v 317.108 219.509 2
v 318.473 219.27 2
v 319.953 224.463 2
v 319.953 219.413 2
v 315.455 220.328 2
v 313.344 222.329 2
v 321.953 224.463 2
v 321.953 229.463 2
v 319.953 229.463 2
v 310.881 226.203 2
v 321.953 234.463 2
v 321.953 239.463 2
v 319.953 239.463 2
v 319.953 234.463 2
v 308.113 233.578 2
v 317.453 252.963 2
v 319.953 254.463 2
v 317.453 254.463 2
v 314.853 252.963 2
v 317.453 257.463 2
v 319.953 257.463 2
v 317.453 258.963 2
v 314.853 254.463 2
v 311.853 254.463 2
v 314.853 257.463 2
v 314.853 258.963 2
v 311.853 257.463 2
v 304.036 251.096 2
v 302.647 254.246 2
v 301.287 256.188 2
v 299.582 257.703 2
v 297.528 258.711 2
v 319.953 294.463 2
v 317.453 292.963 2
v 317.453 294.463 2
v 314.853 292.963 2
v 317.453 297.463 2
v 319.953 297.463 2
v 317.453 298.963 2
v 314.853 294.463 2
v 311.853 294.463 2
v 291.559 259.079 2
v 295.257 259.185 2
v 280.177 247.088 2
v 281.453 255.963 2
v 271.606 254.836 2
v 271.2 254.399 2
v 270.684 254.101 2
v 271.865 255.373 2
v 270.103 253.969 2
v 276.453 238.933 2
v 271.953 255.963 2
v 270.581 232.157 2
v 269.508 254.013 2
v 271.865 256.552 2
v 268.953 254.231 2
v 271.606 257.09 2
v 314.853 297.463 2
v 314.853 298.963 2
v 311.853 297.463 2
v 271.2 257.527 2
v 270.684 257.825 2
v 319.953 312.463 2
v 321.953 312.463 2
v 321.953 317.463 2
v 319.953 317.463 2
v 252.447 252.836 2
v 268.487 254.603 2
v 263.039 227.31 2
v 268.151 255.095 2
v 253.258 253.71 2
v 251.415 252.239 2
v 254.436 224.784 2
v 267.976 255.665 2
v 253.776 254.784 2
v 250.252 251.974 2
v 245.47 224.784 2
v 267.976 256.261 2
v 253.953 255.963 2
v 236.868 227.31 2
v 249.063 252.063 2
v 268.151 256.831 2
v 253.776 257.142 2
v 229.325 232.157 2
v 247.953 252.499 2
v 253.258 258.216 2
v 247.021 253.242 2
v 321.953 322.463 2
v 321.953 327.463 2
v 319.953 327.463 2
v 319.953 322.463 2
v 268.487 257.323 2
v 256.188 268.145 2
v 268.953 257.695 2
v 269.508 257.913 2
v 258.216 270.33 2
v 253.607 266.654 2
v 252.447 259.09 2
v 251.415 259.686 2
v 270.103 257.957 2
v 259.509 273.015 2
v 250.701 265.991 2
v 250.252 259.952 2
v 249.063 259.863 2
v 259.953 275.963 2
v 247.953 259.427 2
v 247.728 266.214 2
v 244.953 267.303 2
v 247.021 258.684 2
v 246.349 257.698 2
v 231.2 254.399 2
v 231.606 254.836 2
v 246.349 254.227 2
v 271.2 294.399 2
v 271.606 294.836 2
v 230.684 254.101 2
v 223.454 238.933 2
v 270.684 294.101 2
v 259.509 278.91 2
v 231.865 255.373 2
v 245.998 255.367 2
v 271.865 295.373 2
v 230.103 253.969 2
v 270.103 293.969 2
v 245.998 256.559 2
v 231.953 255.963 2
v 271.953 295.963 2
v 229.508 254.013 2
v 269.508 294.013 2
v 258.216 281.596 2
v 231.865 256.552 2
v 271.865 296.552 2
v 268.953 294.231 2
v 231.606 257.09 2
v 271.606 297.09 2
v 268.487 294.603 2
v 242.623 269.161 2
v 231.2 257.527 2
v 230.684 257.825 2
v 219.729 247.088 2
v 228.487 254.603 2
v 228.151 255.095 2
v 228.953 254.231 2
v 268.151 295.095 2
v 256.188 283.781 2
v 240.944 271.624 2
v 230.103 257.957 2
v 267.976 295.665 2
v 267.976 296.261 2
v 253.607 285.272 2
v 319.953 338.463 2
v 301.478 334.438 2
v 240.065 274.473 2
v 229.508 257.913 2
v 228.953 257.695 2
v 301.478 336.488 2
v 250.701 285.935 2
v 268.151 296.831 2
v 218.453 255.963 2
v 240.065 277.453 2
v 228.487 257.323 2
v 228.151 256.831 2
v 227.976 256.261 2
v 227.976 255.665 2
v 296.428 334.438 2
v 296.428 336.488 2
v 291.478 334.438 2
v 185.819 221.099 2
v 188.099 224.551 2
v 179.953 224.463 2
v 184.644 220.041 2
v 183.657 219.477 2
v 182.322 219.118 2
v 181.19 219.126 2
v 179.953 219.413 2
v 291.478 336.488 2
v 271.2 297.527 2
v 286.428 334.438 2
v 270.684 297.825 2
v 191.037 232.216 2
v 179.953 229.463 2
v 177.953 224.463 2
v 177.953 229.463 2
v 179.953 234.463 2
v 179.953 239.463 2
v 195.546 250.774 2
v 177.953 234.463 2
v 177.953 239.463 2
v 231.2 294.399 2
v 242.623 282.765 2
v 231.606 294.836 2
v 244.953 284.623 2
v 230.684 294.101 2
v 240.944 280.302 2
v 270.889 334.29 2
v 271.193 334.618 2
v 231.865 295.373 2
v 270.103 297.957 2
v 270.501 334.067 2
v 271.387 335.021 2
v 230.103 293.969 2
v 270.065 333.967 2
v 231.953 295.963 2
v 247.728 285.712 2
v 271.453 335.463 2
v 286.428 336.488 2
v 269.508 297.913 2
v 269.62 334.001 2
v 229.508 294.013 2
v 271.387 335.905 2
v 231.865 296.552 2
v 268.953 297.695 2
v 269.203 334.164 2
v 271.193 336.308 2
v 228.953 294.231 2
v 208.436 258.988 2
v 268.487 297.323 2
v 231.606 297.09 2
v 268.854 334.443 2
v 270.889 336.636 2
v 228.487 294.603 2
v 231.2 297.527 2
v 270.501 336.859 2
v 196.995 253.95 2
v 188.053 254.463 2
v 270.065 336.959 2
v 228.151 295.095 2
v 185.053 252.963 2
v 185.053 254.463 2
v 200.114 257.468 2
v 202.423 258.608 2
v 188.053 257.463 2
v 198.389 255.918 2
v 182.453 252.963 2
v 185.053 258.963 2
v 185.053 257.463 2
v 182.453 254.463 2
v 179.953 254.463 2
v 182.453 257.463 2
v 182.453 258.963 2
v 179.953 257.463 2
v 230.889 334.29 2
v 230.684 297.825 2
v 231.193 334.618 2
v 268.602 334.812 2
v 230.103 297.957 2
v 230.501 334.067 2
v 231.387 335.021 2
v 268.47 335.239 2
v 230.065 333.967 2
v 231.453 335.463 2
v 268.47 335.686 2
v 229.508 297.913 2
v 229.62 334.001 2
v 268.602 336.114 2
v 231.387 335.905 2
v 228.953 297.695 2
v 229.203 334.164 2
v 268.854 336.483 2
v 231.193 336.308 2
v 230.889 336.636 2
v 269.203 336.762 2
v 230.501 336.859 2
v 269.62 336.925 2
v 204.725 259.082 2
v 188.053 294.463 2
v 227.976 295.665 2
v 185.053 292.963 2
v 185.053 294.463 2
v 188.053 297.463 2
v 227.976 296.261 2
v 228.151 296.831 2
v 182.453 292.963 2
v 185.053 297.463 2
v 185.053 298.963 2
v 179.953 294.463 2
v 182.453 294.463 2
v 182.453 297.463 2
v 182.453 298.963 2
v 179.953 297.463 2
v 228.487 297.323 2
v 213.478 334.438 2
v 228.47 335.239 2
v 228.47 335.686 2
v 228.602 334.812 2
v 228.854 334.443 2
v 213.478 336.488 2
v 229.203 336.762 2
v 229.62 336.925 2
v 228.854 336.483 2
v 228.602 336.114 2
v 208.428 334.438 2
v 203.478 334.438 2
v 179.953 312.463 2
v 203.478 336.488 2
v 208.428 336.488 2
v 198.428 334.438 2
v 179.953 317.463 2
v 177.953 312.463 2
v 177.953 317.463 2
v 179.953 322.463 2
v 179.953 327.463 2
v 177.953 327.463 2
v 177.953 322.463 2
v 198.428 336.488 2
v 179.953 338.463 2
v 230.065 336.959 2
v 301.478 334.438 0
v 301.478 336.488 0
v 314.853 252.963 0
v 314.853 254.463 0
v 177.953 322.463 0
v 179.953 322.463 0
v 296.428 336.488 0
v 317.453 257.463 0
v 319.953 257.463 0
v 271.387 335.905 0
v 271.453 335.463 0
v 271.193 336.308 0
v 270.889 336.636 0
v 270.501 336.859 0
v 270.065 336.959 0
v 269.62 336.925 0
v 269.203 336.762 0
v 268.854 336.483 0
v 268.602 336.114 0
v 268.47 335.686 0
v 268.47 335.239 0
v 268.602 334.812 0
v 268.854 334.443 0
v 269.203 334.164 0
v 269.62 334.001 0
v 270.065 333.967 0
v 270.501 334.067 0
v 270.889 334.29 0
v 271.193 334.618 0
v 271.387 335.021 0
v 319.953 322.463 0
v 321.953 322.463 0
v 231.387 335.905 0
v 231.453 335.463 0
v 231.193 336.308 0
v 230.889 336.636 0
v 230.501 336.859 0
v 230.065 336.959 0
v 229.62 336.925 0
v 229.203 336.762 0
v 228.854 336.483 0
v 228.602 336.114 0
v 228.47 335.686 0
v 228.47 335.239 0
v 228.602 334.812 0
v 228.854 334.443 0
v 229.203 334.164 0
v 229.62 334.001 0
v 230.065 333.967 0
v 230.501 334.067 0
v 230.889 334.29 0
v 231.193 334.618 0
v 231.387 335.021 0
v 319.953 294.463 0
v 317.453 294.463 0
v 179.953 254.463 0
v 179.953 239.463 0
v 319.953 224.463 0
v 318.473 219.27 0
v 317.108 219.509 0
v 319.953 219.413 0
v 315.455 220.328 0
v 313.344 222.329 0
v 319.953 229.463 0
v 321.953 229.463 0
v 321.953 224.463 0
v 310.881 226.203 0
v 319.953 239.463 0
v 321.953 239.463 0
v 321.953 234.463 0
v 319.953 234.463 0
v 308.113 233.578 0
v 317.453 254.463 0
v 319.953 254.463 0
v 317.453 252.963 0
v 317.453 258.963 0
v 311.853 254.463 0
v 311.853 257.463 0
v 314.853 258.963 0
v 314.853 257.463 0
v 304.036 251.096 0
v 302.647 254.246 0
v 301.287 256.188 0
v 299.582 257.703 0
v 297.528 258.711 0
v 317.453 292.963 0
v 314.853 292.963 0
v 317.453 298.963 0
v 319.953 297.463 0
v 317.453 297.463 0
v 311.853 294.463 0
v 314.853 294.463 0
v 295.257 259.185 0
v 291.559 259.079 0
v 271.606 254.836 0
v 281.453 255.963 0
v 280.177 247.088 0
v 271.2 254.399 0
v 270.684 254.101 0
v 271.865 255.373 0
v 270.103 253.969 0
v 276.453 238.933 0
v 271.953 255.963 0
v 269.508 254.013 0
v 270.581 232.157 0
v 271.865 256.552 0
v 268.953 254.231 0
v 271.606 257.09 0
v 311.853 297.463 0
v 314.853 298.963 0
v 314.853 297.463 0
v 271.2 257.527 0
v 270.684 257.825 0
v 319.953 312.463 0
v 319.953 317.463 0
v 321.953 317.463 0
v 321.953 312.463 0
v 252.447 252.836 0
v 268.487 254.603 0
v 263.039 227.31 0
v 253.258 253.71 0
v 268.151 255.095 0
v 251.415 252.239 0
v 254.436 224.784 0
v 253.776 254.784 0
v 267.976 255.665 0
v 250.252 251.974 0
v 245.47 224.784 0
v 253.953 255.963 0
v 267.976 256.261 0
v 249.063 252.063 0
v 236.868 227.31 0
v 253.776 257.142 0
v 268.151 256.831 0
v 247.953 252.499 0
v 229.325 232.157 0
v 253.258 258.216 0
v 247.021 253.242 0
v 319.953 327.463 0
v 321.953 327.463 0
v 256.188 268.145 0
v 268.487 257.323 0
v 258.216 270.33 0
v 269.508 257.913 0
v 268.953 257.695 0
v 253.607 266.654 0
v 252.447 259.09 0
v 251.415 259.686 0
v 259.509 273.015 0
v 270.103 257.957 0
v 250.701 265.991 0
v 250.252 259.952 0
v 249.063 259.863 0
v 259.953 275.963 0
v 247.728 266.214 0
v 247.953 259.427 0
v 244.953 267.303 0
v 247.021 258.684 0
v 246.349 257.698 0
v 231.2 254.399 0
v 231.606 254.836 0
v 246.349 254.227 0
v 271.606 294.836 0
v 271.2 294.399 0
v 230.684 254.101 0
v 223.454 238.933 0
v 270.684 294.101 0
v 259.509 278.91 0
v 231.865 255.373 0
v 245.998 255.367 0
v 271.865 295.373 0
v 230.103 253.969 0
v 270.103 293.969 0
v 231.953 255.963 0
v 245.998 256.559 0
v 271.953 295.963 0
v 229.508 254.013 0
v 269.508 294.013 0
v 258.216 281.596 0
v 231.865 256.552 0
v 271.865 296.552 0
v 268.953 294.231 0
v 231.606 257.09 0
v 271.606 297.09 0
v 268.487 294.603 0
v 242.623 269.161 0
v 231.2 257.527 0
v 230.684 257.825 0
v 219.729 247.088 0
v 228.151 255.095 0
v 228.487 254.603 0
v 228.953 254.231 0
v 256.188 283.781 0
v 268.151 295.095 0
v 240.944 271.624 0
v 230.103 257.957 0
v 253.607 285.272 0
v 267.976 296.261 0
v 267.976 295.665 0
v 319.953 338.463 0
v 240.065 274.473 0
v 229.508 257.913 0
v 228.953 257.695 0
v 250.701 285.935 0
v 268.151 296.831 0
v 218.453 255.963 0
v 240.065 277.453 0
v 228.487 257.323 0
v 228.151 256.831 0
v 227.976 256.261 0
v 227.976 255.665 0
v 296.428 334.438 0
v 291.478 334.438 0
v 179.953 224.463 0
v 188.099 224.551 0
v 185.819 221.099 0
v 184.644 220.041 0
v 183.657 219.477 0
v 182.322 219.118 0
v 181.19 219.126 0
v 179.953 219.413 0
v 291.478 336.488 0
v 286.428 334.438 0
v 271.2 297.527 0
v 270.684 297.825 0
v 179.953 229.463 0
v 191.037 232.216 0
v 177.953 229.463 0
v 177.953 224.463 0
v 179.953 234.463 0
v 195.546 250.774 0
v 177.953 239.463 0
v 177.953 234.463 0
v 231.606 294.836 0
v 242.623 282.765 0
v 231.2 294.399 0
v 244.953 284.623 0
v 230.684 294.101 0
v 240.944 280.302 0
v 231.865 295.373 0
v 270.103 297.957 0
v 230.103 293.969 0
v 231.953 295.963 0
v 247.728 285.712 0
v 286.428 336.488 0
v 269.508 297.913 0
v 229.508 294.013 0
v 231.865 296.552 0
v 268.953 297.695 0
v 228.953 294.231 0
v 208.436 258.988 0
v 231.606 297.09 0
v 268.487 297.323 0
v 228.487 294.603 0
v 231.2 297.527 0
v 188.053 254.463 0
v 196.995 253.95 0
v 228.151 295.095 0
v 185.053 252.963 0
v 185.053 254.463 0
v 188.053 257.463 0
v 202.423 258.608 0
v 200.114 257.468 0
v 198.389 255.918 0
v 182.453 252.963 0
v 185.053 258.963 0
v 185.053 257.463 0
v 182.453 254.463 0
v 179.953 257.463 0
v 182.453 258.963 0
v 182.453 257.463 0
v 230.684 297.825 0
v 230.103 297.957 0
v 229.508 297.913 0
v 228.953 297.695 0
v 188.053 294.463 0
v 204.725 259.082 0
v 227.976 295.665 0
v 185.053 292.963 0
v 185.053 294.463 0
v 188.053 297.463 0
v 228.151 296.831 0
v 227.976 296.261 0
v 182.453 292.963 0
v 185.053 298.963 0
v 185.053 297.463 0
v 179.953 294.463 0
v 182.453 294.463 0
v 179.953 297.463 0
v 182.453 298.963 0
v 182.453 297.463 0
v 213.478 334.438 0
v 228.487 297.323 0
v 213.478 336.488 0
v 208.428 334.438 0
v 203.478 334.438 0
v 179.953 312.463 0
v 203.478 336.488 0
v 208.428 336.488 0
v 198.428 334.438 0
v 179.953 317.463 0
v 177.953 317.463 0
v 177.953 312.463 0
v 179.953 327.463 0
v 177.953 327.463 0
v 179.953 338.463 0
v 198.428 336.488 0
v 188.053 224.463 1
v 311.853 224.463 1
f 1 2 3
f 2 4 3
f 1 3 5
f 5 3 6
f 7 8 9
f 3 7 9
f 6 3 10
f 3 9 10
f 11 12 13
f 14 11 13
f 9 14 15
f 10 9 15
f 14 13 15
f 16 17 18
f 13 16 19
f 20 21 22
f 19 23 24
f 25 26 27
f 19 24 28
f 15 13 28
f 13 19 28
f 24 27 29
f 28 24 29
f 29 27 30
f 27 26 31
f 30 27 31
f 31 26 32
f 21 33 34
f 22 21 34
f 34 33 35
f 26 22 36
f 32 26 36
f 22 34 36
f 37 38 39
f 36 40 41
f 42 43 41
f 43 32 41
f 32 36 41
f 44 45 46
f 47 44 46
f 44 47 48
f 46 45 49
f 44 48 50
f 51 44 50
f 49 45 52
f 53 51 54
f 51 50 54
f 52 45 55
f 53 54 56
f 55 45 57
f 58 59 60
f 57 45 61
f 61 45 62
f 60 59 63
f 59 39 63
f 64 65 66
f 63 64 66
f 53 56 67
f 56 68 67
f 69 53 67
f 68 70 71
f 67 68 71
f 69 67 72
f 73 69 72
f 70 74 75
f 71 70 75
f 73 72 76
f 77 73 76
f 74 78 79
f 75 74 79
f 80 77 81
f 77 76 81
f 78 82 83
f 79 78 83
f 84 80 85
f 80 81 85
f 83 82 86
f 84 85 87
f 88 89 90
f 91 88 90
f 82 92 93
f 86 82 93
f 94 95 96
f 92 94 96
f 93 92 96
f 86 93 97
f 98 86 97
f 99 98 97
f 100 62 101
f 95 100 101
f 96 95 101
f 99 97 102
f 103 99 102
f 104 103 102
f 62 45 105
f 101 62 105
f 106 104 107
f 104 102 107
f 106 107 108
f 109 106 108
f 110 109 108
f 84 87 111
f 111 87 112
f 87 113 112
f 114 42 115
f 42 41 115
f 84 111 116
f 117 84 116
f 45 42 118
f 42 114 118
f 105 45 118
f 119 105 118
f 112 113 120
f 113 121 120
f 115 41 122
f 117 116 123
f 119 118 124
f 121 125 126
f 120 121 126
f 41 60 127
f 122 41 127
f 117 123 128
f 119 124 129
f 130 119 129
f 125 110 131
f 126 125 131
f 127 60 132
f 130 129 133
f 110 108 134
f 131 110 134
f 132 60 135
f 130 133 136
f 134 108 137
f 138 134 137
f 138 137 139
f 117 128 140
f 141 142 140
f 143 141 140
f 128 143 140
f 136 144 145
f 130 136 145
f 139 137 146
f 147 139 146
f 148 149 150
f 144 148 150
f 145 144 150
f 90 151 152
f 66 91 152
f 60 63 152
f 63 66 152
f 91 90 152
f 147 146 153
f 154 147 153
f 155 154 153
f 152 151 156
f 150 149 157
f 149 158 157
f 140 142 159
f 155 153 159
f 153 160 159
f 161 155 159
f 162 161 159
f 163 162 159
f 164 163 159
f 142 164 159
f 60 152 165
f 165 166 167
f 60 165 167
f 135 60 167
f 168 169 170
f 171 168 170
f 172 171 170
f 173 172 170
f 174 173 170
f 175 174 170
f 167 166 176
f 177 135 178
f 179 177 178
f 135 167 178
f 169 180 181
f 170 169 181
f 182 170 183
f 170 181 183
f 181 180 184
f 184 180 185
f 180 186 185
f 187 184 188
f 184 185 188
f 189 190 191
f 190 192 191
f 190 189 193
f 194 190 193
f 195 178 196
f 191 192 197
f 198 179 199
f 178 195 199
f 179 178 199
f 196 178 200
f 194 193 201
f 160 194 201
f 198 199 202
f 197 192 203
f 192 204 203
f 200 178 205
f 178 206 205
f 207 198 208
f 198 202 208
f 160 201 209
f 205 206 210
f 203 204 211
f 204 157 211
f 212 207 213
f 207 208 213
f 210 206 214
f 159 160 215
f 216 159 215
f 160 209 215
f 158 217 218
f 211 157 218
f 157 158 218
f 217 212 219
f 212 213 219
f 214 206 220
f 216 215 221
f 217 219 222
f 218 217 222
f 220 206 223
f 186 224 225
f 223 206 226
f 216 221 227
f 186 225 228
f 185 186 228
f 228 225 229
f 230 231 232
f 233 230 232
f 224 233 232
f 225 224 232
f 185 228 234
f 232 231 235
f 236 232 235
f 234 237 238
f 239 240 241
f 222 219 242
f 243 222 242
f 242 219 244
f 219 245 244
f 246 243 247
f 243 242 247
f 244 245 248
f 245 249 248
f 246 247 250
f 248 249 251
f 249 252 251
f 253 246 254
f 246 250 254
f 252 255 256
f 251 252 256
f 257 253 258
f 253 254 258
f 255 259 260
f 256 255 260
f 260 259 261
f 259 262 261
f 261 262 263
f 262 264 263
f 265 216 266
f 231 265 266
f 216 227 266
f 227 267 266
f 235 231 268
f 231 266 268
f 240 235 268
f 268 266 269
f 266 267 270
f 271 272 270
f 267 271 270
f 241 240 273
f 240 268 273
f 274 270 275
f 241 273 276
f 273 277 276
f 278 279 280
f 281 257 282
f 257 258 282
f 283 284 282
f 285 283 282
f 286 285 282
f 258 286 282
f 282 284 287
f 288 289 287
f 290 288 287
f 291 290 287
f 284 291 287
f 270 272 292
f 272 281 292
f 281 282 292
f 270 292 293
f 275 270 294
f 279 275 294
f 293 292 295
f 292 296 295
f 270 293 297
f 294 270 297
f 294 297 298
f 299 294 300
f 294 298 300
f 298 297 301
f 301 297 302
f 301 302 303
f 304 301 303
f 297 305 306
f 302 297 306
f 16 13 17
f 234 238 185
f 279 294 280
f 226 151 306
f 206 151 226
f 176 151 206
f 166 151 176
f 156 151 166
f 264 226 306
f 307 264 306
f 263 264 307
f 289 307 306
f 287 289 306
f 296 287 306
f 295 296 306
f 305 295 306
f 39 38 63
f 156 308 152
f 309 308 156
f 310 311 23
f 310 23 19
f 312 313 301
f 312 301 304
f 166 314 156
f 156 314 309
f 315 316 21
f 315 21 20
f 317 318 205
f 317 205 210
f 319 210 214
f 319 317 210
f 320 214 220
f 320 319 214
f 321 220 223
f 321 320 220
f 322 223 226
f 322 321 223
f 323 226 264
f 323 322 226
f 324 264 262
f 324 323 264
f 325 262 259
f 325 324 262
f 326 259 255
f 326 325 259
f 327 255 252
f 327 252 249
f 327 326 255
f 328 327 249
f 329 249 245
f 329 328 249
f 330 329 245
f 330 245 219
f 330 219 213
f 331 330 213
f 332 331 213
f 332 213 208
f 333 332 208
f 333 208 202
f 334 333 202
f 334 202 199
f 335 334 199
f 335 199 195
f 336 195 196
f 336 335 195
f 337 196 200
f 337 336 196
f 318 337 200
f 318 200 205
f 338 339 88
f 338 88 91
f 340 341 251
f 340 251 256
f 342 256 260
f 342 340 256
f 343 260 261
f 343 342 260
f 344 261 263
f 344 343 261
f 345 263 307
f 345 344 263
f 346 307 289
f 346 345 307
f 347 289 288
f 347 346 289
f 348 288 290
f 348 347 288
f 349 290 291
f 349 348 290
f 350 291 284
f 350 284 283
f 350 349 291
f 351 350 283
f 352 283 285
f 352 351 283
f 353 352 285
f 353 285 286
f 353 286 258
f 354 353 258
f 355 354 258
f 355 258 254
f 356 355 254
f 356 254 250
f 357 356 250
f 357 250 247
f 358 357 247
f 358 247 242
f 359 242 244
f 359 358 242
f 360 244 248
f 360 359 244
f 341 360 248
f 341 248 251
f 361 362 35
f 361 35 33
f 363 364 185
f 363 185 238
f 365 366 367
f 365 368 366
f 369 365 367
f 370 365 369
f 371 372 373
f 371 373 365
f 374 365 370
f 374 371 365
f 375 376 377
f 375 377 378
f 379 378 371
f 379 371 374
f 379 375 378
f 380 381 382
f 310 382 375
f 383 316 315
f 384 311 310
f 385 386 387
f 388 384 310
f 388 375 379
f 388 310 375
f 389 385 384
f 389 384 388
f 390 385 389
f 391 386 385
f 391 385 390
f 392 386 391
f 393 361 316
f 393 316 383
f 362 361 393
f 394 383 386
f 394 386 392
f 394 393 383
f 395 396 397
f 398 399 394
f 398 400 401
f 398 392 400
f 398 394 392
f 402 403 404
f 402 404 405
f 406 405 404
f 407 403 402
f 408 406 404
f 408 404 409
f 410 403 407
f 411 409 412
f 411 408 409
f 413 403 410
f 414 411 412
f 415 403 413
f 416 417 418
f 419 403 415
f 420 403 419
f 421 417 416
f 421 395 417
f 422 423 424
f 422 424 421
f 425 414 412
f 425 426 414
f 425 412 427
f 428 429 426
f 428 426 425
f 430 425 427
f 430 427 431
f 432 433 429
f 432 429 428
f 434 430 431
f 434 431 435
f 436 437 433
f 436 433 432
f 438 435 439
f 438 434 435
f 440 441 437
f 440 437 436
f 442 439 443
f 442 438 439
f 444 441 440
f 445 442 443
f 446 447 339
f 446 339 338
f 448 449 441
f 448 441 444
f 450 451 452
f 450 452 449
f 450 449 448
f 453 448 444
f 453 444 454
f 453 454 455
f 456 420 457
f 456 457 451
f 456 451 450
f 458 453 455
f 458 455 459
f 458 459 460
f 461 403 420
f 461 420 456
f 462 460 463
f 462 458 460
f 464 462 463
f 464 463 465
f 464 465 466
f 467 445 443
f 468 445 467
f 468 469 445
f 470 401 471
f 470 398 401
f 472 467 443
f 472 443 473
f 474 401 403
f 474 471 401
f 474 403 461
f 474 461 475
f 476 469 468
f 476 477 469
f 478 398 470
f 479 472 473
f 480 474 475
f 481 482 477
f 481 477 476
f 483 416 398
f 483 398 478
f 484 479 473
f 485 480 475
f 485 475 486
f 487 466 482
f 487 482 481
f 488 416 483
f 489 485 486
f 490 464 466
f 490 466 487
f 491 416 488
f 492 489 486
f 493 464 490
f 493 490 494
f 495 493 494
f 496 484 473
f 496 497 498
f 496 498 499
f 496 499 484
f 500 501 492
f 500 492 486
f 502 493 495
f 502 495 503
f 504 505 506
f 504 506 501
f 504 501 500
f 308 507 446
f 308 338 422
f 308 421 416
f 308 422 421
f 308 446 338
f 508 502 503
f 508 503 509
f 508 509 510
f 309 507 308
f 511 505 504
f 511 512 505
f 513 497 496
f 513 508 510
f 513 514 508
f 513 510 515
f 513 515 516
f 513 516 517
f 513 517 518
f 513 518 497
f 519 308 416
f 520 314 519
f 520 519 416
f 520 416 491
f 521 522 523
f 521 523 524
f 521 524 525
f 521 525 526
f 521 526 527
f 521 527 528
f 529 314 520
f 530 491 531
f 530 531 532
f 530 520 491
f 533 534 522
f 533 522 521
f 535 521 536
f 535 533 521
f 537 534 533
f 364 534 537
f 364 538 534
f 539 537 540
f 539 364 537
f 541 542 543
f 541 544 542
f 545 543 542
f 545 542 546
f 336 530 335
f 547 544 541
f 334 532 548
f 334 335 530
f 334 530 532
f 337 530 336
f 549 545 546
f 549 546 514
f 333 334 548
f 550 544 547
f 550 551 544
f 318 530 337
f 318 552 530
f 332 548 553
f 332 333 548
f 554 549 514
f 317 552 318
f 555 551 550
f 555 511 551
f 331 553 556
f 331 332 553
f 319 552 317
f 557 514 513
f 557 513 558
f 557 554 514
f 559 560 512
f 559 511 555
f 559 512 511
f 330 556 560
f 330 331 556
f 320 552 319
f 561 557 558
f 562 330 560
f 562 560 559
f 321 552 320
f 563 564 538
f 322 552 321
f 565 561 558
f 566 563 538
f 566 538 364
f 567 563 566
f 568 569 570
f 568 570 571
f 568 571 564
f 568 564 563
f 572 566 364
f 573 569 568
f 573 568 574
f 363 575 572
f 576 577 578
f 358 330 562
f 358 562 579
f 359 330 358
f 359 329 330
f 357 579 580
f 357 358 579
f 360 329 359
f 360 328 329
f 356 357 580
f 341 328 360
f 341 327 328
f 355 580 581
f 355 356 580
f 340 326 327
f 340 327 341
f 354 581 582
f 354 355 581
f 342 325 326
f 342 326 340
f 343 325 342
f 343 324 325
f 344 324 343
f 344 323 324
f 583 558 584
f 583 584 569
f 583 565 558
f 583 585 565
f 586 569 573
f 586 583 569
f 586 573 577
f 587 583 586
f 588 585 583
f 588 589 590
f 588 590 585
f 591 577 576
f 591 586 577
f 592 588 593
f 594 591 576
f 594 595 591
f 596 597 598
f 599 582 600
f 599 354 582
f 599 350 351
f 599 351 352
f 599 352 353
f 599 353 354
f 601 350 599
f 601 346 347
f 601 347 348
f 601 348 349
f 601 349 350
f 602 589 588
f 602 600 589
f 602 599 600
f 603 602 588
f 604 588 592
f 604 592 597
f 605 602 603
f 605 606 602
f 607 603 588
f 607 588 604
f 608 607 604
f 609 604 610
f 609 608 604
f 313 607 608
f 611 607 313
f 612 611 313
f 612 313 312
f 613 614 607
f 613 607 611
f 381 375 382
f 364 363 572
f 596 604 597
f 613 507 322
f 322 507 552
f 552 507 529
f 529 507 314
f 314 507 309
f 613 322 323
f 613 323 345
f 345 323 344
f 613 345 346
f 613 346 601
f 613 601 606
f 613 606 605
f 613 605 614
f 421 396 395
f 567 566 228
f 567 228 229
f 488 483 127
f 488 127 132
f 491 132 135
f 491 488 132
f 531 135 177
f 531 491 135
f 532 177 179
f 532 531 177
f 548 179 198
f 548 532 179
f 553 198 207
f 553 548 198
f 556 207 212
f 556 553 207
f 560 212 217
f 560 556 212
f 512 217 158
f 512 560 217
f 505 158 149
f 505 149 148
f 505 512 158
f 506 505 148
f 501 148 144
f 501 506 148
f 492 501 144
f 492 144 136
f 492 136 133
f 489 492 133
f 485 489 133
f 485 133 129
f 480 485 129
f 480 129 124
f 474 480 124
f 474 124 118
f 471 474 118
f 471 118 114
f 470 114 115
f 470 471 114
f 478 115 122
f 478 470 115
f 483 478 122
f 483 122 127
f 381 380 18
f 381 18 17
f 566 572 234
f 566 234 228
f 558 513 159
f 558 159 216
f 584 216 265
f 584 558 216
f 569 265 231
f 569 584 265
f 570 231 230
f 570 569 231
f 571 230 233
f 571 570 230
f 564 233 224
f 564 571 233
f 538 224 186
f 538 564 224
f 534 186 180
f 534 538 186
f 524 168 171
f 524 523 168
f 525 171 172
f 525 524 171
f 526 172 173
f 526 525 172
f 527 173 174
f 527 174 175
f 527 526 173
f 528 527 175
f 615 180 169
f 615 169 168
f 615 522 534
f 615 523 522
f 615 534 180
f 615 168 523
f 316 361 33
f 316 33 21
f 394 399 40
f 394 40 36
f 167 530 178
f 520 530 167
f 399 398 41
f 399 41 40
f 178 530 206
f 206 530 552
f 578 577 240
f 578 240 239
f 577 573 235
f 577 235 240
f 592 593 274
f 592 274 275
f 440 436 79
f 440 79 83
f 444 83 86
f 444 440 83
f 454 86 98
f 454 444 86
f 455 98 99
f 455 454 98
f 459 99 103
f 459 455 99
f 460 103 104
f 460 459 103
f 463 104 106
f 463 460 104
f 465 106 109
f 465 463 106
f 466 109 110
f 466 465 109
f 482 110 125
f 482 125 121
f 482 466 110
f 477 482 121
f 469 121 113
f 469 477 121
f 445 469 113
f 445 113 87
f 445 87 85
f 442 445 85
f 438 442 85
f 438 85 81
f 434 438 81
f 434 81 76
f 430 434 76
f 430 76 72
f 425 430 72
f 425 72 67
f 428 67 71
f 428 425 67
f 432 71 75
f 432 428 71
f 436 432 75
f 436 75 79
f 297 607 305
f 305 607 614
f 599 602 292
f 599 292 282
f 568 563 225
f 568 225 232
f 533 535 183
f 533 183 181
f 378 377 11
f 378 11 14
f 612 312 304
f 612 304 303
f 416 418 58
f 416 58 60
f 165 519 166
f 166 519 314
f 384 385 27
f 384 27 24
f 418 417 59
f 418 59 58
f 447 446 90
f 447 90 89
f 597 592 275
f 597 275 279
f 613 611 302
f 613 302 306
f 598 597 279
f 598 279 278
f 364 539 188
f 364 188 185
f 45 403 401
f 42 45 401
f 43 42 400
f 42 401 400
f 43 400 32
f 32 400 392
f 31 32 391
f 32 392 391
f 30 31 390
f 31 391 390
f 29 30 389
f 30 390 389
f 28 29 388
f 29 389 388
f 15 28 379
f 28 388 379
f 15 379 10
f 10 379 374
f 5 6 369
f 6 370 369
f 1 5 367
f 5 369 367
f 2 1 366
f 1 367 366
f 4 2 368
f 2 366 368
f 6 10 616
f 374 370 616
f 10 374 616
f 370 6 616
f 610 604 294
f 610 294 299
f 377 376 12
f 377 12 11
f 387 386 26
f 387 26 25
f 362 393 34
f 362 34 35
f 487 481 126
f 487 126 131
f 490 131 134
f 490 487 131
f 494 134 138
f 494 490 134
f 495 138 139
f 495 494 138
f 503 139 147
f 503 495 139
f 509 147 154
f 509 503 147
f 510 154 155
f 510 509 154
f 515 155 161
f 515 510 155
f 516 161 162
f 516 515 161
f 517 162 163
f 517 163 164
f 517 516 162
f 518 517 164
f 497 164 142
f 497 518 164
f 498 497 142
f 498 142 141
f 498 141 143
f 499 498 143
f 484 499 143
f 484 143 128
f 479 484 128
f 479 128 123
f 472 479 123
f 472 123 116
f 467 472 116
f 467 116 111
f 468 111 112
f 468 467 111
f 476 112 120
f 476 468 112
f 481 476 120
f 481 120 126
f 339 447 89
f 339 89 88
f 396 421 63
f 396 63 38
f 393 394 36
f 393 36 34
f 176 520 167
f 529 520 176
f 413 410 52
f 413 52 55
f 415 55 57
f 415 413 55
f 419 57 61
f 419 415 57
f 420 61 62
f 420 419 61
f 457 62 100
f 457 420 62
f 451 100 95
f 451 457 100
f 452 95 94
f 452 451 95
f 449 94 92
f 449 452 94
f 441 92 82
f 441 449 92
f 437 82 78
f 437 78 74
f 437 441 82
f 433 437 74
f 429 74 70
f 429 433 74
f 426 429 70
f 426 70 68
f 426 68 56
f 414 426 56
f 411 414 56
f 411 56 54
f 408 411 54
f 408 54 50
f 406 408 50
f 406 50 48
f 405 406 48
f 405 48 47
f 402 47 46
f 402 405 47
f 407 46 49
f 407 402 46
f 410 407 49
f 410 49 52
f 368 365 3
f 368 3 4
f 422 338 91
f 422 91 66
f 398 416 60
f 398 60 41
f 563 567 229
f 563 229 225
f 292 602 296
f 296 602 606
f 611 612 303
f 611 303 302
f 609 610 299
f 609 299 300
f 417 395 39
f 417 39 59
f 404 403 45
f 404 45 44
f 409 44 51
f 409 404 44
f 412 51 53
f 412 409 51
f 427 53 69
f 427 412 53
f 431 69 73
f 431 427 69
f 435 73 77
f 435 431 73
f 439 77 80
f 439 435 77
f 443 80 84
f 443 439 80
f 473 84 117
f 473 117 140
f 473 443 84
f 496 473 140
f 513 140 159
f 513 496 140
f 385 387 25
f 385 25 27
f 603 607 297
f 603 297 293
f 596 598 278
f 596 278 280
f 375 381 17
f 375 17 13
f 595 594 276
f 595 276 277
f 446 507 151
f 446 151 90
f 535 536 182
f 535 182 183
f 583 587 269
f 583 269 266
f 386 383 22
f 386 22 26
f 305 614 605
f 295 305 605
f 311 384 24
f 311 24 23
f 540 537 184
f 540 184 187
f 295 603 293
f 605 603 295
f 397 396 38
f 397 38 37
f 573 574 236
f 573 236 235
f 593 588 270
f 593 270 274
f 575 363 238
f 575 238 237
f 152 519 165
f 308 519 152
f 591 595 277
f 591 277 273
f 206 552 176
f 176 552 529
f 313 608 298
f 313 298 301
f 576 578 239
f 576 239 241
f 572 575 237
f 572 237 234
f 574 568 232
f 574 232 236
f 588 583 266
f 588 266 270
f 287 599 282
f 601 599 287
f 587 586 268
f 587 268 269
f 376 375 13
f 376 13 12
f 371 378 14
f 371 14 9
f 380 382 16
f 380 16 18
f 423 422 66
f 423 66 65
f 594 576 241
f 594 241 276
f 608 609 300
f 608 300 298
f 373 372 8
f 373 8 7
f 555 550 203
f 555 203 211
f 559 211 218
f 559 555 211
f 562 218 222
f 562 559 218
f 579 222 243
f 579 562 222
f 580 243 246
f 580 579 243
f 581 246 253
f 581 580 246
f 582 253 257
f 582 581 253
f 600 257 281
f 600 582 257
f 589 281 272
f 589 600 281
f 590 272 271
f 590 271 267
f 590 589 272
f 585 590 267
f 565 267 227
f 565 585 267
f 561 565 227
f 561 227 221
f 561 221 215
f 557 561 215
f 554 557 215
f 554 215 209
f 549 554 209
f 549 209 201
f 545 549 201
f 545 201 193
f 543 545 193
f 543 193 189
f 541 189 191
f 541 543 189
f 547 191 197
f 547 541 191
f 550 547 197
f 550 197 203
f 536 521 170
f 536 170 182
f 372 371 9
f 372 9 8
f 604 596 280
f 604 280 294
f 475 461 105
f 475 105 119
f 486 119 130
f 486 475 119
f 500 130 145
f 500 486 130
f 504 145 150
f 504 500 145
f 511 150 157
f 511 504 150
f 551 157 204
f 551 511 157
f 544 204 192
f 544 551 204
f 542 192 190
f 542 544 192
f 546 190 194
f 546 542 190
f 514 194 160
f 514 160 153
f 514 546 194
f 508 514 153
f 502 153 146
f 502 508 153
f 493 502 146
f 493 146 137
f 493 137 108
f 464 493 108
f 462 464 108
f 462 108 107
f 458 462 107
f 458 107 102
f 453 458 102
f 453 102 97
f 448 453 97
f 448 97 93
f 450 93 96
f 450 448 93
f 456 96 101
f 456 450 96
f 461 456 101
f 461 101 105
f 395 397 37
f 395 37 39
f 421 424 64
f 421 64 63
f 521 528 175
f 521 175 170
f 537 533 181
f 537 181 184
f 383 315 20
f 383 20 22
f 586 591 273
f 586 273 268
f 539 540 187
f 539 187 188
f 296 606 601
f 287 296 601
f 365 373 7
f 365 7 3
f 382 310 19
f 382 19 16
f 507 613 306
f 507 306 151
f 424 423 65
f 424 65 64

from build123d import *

# Parameters (mm, degrees)
SKETCH_1_R      = 10
SKETCH_1_R_2    = 4
SKETCH_1_R_3    = 1.5
SKETCH_1_R_4    = 2
SKETCH_1_W      = 5.05
SKETCH_1_H      = 2.05
EXTRUDE_1_DEPTH = 2


with BuildPart() as part:
    # 草图1 → 凸台-拉伸1 (new body)
    with BuildSketch(Plane.XY):
        with BuildLine():
            Line((317.453360513, 257.462931603), (317.453360513, 258.962931603))
            Line((317.453360513, 258.962931603), (314.853360513, 258.962931603))
            Line((314.853360513, 258.962931603), (314.853360513, 257.462931603))
            Line((314.853360513, 257.462931603), (311.853360513, 257.462931603))
            Line((311.853360513, 257.462931603), (311.853360513, 254.462931603))
            Line((311.853360513, 254.462931603), (314.853360513, 254.462931603))
            Line((314.853360513, 254.462931603), (314.853360513, 252.962931603))
            Line((314.853360513, 252.962931603), (317.453360513, 252.962931603))
            Line((317.453360513, 252.962931603), (317.453360513, 254.462931603))
            Line((317.453360513, 254.462931603), (319.953360513, 254.462931603))
            Line((319.953360513, 254.462931603), (319.953360513, 239.462931603))
            Line((319.953360513, 239.462931603), (321.953360513, 239.462931603))
            Line((321.953360513, 239.462931603), (321.953360513, 234.462931603))
            Line((321.953360513, 234.462931603), (319.953360513, 234.462931603))
            Line((319.953360513, 234.462931603), (319.953360513, 229.462931603))
            Line((319.953360513, 229.462931603), (321.953360513, 229.462931603))
            Line((321.953360513, 229.462931603), (321.953360513, 224.462931603))
            Line((321.953360513, 224.462931603), (319.953360513, 224.462931603))
            Line((319.953360513, 224.462931603), (319.953360513, 219.413055772))
            add(Edge.make_bspline(
                [(281.453360513, 255.962931603), (311.117403984, 268.788380876), (299.963906714, 235.827960028), (316.368347708, 218.592651753), (319.953360513, 219.413055772)],
                knots=[0, 0, 0, 0, 0.841205097, 1, 1, 1, 1], degree=3))
            ThreePointArc((281.453360513, 255.962931603), (249.953360513, 224.462931603), (218.453360513, 255.962931603))
            add(Edge.make_bspline(
                [(218.453360513, 255.962931603), (189.43429352, 268.354580122), (198.595511202, 236.610496326), (183.899274023, 218.075281385), (179.953360513, 219.413055772)],
                knots=[0, 0, 0, 0, 0.837139609, 1, 1, 1, 1], degree=3))
            Line((179.953360513, 219.413055772), (179.953360513, 224.462931603))
            Line((179.953360513, 224.462931603), (177.953360513, 224.462931603))
            Line((177.953360513, 224.462931603), (177.953360513, 229.462931603))
            Line((177.953360513, 229.462931603), (179.953360513, 229.462931603))
            Line((179.953360513, 229.462931603), (179.953360513, 234.462931603))
            Line((179.953360513, 234.462931603), (177.953360513, 234.462931603))
            Line((177.953360513, 234.462931603), (177.953360513, 239.462931603))
            Line((177.953360513, 239.462931603), (179.953360513, 239.462931603))
            Line((179.953360513, 239.462931603), (179.953360513, 254.462931603))
            Line((179.953360513, 254.462931603), (182.453360513, 254.462931603))
            Line((182.453360513, 254.462931603), (182.453360513, 252.962931602))
            Line((182.453360513, 252.962931602), (185.053360513, 252.962931602))
            Line((185.053360513, 252.962931602), (185.053360513, 254.462931603))
            Line((185.053360513, 254.462931603), (188.053360513, 254.462931603))
            Line((188.053360513, 254.462931603), (188.053360513, 257.462931603))
            Line((188.053360513, 257.462931603), (185.053360513, 257.462931603))
            Line((185.053360513, 257.462931603), (185.053360513, 258.962931602))
            Line((185.053360513, 258.962931602), (182.453360513, 258.962931602))
            Line((182.453360513, 258.962931602), (182.453360513, 257.462931603))
            Line((182.453360513, 257.462931603), (179.953360513, 257.462931603))
            Line((179.953360513, 257.462931603), (179.953360513, 294.462931603))
            Line((179.953360513, 294.462931603), (182.453360513, 294.462931603))
            Line((182.453360513, 294.462931603), (182.453360513, 292.962931603))
            Line((182.453360513, 292.962931603), (185.053360513, 292.962931603))
            Line((185.053360513, 292.962931603), (185.053360513, 294.462931603))
            Line((185.053360513, 294.462931603), (188.053360513, 294.462931603))
            Line((188.053360513, 294.462931603), (188.053360513, 297.462931603))
            Line((188.053360513, 297.462931603), (185.053360513, 297.462931603))
            Line((185.053360513, 297.462931603), (185.053360513, 298.962931603))
            Line((185.053360513, 298.962931603), (182.453360513, 298.962931603))
            Line((182.453360513, 298.962931603), (182.453360513, 297.462931603))
            Line((182.453360513, 297.462931603), (179.953360513, 297.462931603))
            Line((179.953360513, 297.462931603), (179.953360513, 312.462931603))
            Line((179.953360513, 312.462931603), (177.953360513, 312.462931603))
            Line((177.953360513, 312.462931603), (177.953360513, 317.462931603))
            Line((177.953360513, 317.462931603), (179.953360513, 317.462931603))
            Line((179.953360513, 317.462931603), (179.953360513, 322.462931603))
            Line((179.953360513, 322.462931603), (177.953360513, 322.462931603))
            Line((177.953360513, 322.462931603), (177.953360513, 327.462931603))
            Line((177.953360513, 327.462931603), (179.953360513, 327.462931603))
            Line((179.953360513, 327.462931603), (179.953360513, 338.462931603))
            Line((179.953360513, 338.462931603), (319.953360513, 338.462931603))
            Line((319.953360513, 338.462931603), (319.953360513, 327.462931603))
            Line((319.953360513, 327.462931603), (321.953360513, 327.462931603))
            Line((321.953360513, 327.462931603), (321.953360513, 322.462931603))
            Line((321.953360513, 322.462931603), (319.953360513, 322.462931603))
            Line((319.953360513, 322.462931603), (319.953360513, 317.462931603))
            Line((319.953360513, 317.462931603), (321.953360513, 317.462931603))
            Line((321.953360513, 317.462931603), (321.953360513, 312.462931603))
            Line((321.953360513, 312.462931603), (319.953360513, 312.462931603))
            Line((319.953360513, 312.462931603), (319.953360513, 297.462931603))
            Line((319.953360513, 297.462931603), (317.453360513, 297.462931603))
            Line((317.453360513, 297.462931603), (317.453360513, 298.962931603))
            Line((317.453360513, 298.962931603), (314.853360513, 298.962931603))
            Line((314.853360513, 298.962931603), (314.853360513, 297.462931603))
            Line((314.853360513, 297.462931603), (311.853360513, 297.462931603))
            Line((311.853360513, 297.462931603), (311.853360513, 294.462931603))
            Line((311.853360513, 294.462931603), (314.853360513, 294.462931603))
            Line((314.853360513, 294.462931603), (314.853360513, 292.962931603))
            Line((314.853360513, 292.962931603), (317.453360513, 292.962931603))
            Line((317.453360513, 292.962931603), (317.453360513, 294.462931603))
            Line((317.453360513, 294.462931603), (319.953360513, 294.462931603))
            Line((319.953360513, 294.462931603), (319.953360513, 257.462931603))
            Line((319.953360513, 257.462931603), (317.453360513, 257.462931603))
        make_face()
        with Locations((249.953360513, 275.962931603)):
            Circle(SKETCH_1_R, mode=Mode.SUBTRACT)
        with Locations((249.953360513, 255.962931603)):
            Circle(SKETCH_1_R_2, mode=Mode.SUBTRACT)
        with Locations((229.953360513, 335.462931603)):
            Circle(SKETCH_1_R_3, mode=Mode.SUBTRACT)
        with Locations((269.953360513, 335.462931603)):
            Circle(SKETCH_1_R_3, mode=Mode.SUBTRACT)
        with Locations((229.953360513, 255.962931603)):
            Circle(SKETCH_1_R_4, mode=Mode.SUBTRACT)
        with Locations((229.953360513, 295.962931603)):
            Circle(SKETCH_1_R_4, mode=Mode.SUBTRACT)
        with Locations((269.953360513, 295.962931603)):
            Circle(SKETCH_1_R_4, mode=Mode.SUBTRACT)
        with Locations((269.953360513, 255.962931603)):
            Circle(SKETCH_1_R_4, mode=Mode.SUBTRACT)
        with Locations((288.953360513, 335.462931603)):
            Rectangle(SKETCH_1_W, SKETCH_1_H, mode=Mode.SUBTRACT)
        with Locations((298.953360513, 335.462931603)):
            Rectangle(SKETCH_1_W, SKETCH_1_H, mode=Mode.SUBTRACT)
        with Locations((200.953360513, 335.462931603)):
            Rectangle(SKETCH_1_W, SKETCH_1_H, mode=Mode.SUBTRACT)
        with Locations((210.953360513, 335.462931603)):
            Rectangle(SKETCH_1_W, SKETCH_1_H, mode=Mode.SUBTRACT)
    extrude(amount=EXTRUDE_1_DEPTH)


solid = part.part
